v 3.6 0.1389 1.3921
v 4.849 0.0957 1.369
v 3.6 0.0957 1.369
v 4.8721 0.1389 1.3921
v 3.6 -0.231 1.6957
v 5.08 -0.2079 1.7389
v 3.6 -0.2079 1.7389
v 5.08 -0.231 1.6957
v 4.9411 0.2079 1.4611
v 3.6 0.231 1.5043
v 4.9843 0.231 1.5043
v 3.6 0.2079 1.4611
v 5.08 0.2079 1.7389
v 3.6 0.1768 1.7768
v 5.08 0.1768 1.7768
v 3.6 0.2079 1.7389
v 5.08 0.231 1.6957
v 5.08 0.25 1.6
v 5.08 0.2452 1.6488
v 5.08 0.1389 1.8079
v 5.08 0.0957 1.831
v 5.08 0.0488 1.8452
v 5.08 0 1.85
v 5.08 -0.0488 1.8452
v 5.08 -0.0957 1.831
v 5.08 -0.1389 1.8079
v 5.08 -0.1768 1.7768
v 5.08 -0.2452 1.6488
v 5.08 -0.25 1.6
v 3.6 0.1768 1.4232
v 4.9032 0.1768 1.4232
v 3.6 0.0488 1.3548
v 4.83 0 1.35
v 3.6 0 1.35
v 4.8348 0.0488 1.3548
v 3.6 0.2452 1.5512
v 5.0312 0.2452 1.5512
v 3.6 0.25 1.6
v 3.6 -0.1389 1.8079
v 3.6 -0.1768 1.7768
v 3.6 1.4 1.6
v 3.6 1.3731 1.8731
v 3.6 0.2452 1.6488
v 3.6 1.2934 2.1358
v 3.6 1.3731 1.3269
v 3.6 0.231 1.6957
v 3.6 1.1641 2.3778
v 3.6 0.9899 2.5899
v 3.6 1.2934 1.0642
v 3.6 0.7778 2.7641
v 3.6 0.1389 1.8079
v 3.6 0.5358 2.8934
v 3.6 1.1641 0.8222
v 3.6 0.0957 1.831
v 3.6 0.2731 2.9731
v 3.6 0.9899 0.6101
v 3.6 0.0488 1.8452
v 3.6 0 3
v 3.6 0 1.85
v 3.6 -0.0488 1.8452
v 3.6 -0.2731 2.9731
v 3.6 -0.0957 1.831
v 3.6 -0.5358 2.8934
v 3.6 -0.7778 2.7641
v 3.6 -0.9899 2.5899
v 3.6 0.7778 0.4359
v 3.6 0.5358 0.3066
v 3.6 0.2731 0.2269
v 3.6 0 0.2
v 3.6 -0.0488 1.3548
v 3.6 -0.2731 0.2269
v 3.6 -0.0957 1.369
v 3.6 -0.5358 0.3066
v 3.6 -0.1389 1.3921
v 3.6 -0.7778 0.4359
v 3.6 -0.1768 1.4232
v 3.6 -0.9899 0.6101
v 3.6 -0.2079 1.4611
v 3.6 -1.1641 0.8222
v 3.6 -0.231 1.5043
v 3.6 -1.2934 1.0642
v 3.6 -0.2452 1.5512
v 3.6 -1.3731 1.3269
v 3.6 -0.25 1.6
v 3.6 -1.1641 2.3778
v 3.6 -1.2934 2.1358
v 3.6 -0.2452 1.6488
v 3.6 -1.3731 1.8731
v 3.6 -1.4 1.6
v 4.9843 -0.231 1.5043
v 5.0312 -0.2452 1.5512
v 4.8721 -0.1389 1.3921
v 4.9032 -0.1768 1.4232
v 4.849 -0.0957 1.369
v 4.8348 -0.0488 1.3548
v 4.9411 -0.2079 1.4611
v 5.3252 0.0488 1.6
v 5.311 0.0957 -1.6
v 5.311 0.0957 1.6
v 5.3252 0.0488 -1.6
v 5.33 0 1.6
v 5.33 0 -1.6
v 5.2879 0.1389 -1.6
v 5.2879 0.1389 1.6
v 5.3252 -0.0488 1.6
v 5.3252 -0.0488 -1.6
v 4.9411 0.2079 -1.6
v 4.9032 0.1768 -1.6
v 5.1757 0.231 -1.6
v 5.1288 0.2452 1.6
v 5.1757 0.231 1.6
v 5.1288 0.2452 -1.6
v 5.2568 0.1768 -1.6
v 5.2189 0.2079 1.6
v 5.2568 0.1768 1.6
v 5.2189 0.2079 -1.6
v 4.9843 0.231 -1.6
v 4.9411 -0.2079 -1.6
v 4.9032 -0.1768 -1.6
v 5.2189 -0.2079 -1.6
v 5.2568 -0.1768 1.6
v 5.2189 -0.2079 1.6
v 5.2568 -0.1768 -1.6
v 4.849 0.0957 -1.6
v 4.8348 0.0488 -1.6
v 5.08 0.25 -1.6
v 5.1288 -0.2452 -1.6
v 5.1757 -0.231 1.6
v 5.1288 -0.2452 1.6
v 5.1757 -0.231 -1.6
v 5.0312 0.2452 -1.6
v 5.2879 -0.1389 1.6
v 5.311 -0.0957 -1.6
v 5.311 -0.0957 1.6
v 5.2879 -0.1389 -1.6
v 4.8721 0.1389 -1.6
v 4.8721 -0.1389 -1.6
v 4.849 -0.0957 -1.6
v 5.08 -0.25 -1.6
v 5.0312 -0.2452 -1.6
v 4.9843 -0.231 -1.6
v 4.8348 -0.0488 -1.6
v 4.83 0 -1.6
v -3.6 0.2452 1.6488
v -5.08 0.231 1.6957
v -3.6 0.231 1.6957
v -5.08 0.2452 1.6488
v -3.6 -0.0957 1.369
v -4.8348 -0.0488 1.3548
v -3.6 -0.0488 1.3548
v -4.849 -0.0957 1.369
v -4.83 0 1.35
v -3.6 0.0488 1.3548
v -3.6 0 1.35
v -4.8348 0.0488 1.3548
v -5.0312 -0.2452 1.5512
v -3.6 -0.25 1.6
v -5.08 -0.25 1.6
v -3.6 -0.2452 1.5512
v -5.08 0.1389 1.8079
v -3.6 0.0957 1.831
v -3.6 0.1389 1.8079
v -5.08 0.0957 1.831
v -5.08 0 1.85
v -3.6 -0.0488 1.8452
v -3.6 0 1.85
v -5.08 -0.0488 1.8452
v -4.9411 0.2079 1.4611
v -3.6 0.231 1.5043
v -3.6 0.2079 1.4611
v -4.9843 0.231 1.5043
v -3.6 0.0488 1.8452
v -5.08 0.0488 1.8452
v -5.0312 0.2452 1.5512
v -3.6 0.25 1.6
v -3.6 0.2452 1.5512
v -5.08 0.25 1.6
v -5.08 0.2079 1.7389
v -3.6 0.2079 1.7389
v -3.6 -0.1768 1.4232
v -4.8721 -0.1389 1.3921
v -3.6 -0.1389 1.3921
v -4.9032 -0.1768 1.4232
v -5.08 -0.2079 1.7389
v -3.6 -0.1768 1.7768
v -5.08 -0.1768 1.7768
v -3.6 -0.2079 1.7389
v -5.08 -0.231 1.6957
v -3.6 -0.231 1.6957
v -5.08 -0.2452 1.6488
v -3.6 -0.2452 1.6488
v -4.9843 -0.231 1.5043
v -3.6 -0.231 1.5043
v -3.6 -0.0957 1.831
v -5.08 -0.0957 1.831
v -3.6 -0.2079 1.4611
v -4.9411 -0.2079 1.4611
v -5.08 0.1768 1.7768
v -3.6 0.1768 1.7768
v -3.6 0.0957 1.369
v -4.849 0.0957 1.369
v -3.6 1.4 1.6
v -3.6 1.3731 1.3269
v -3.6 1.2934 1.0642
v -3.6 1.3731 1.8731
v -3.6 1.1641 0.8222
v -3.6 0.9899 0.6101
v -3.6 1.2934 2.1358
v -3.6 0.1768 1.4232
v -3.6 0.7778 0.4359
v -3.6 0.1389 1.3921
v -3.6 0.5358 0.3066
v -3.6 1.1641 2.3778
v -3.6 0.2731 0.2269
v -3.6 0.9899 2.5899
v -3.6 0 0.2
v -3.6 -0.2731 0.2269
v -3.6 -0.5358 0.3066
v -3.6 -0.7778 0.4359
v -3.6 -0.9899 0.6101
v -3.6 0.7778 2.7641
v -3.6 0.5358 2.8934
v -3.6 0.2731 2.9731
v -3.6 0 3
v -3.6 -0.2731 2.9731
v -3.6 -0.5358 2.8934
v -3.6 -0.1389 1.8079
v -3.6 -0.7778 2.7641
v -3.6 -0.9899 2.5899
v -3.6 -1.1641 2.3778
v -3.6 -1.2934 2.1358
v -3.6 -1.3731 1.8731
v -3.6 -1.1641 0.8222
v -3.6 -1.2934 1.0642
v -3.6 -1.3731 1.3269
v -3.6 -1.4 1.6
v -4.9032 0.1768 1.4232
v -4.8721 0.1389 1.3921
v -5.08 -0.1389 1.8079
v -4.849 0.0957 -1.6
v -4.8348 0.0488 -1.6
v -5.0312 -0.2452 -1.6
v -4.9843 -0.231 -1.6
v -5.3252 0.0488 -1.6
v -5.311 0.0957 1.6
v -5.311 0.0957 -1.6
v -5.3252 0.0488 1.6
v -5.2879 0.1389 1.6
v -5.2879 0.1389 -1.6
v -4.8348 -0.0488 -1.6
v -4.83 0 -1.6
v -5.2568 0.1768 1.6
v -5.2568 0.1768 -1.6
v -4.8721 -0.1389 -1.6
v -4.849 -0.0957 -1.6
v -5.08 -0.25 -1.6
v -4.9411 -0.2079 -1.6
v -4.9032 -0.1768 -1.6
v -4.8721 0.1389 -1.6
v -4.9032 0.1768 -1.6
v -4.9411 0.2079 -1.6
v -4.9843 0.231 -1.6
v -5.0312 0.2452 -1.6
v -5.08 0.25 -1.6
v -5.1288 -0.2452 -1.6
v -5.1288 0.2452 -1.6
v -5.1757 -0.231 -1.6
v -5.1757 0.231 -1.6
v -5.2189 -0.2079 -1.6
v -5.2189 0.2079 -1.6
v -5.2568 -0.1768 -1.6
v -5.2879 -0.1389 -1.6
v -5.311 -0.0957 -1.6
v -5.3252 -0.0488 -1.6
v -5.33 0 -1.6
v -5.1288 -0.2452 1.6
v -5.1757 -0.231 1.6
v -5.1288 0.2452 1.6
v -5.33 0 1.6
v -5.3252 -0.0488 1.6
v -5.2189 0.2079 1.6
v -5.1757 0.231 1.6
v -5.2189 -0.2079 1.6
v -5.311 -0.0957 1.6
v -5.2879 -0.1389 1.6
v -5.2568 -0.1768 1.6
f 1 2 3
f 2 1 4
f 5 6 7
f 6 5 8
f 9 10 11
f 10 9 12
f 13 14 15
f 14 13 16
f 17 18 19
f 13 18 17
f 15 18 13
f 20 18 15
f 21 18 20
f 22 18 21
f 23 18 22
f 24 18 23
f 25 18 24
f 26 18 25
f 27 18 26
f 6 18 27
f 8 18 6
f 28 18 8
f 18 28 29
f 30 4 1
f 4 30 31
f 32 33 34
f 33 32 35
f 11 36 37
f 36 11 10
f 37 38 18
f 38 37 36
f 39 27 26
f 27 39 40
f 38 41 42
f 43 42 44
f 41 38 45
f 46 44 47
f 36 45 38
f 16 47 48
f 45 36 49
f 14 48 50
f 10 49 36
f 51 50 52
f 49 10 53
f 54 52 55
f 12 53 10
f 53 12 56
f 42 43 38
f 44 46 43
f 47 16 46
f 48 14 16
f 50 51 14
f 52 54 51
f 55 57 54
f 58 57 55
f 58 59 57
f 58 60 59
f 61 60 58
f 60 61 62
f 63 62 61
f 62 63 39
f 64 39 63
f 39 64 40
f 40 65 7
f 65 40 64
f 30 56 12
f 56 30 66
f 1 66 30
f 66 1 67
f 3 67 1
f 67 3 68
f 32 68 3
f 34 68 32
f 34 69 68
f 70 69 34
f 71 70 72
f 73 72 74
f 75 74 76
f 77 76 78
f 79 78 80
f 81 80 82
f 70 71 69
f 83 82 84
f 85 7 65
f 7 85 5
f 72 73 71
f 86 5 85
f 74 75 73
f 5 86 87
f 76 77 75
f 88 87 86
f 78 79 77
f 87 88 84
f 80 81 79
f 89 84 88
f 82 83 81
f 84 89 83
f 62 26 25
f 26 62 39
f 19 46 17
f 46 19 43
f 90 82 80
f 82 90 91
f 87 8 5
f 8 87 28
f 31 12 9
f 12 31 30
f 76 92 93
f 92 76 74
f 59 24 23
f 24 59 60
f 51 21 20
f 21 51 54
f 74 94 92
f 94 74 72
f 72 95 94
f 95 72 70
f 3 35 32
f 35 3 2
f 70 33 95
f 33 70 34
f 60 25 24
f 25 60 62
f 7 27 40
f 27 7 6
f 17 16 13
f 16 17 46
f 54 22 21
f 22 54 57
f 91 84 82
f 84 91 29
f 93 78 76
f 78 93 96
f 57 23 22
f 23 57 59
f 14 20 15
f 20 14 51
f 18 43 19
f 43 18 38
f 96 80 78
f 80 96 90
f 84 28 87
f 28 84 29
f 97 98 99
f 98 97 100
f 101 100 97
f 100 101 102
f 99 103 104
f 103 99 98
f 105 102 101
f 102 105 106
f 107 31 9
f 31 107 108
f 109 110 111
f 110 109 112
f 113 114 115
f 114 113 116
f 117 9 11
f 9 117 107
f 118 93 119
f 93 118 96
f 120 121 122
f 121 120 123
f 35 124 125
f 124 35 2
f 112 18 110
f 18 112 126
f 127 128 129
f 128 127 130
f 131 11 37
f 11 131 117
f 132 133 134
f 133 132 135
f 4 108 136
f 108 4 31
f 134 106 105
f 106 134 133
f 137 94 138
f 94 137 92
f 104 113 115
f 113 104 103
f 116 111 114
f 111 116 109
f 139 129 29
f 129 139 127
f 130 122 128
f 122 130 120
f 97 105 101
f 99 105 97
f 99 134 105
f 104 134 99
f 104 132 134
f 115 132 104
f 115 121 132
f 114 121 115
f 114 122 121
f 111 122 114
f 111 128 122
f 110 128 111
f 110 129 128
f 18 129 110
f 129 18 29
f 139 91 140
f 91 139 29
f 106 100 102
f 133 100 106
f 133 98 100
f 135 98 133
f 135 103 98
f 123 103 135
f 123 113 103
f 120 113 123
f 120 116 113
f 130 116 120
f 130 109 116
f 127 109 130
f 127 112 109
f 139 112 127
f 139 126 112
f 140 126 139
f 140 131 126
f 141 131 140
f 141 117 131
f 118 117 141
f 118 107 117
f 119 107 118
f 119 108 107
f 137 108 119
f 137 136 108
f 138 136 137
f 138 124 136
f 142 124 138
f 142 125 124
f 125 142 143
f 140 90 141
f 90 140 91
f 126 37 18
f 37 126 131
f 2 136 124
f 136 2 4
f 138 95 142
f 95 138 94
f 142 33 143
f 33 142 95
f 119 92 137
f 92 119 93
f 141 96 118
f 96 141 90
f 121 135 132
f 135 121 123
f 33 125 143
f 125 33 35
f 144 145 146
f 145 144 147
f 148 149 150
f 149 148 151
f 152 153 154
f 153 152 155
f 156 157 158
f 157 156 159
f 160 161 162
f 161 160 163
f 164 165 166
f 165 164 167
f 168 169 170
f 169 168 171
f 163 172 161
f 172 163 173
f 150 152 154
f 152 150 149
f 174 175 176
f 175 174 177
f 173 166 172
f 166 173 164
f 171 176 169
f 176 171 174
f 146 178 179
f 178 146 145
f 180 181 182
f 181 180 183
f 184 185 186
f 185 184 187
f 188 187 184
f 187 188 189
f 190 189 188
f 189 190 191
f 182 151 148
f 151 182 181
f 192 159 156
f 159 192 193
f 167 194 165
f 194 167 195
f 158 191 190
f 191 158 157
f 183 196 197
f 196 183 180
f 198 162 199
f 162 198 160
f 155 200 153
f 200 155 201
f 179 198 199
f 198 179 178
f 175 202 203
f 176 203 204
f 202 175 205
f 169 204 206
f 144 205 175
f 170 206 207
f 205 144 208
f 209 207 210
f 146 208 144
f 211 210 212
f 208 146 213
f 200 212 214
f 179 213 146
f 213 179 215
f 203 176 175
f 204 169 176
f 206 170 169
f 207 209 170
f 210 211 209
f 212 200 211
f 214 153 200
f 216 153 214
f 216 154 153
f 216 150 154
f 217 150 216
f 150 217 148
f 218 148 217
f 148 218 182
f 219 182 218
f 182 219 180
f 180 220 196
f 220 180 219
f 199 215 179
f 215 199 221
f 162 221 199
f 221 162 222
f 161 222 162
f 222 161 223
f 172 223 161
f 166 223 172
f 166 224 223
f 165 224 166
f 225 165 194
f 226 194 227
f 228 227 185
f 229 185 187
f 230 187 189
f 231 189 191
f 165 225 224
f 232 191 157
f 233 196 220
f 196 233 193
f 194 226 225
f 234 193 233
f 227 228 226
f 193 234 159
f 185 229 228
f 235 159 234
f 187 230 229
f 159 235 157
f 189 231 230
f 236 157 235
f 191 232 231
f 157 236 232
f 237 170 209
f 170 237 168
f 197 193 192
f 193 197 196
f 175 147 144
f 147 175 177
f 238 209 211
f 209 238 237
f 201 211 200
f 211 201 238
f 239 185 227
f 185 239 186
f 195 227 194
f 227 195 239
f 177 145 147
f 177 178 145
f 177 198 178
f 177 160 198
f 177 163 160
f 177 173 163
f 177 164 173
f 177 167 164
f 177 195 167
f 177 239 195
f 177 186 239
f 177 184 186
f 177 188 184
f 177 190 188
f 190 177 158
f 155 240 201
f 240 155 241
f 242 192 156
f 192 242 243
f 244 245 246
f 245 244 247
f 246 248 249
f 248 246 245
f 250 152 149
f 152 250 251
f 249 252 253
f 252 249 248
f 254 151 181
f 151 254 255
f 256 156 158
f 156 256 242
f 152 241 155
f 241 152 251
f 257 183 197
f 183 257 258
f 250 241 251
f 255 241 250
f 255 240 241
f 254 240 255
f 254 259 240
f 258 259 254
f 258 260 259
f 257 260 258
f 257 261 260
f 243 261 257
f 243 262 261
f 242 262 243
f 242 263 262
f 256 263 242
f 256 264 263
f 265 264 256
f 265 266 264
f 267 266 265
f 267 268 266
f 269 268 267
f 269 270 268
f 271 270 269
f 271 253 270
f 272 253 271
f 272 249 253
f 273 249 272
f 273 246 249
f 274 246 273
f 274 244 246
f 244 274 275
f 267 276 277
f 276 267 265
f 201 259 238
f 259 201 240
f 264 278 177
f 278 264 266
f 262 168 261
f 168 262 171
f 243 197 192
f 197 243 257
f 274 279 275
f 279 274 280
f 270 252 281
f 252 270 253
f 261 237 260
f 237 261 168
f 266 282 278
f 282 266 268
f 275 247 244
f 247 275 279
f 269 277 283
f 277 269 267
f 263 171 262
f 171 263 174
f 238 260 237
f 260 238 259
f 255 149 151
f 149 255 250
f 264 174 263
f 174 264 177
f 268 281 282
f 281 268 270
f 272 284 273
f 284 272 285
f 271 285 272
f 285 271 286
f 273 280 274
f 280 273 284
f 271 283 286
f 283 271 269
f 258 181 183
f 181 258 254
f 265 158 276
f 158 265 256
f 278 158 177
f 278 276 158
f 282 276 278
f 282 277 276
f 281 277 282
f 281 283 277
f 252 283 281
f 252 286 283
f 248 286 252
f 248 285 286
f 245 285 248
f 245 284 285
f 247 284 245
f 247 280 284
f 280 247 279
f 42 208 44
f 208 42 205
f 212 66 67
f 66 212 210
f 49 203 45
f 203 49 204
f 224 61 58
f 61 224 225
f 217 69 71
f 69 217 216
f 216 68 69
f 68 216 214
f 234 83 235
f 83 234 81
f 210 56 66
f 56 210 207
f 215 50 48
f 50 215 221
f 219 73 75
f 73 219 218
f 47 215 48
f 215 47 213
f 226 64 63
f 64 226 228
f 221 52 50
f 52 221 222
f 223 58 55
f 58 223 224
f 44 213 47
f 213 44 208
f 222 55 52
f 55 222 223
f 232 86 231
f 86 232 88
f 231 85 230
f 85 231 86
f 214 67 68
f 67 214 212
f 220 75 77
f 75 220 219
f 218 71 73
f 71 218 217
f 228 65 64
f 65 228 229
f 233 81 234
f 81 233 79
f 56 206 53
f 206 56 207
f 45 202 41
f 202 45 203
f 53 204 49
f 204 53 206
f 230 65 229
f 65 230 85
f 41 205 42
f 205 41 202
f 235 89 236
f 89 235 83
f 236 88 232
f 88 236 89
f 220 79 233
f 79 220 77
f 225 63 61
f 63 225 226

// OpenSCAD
// Bourns 78F101J-RC, 100 uH axial drum-core choke used as the AS3935
// 500 kHz antenna. Body 2.79 mm diameter x 7.11 mm long, 0.5 mm leads,
// lying flat on a 10.16 mm lead pitch.
//
// Perimeter only - the winding, the end caps and the lead bends are a
// single cylinder plus straight wires. Authored in KiCad 3D model space.

$fn = 32;

BODY_D = 2.8;
BODY_L = 7.2;
LEAD_D = 0.5;
PITCH = 10.16;
AXIS_Z = BODY_D / 2 + 0.2;   // 0.2 mm standoff off the board

module body() {
    translate([-BODY_L / 2, 0, AXIS_Z])
        rotate([0, 90, 0])
            cylinder(d = BODY_D, h = BODY_L);
}

module lead(sign) {
    // horizontal run from the body end out to the lead hole
    translate([sign * BODY_L / 2, 0, AXIS_Z])
        rotate([0, sign * 90, 0])
            cylinder(d = LEAD_D, h = PITCH / 2 - BODY_L / 2);
    // vertical drop into the board
    translate([sign * PITCH / 2, 0, -1.6])
        cylinder(d = LEAD_D, h = AXIS_Z + 1.6);
}

body();
lead(1);
lead(-1);
